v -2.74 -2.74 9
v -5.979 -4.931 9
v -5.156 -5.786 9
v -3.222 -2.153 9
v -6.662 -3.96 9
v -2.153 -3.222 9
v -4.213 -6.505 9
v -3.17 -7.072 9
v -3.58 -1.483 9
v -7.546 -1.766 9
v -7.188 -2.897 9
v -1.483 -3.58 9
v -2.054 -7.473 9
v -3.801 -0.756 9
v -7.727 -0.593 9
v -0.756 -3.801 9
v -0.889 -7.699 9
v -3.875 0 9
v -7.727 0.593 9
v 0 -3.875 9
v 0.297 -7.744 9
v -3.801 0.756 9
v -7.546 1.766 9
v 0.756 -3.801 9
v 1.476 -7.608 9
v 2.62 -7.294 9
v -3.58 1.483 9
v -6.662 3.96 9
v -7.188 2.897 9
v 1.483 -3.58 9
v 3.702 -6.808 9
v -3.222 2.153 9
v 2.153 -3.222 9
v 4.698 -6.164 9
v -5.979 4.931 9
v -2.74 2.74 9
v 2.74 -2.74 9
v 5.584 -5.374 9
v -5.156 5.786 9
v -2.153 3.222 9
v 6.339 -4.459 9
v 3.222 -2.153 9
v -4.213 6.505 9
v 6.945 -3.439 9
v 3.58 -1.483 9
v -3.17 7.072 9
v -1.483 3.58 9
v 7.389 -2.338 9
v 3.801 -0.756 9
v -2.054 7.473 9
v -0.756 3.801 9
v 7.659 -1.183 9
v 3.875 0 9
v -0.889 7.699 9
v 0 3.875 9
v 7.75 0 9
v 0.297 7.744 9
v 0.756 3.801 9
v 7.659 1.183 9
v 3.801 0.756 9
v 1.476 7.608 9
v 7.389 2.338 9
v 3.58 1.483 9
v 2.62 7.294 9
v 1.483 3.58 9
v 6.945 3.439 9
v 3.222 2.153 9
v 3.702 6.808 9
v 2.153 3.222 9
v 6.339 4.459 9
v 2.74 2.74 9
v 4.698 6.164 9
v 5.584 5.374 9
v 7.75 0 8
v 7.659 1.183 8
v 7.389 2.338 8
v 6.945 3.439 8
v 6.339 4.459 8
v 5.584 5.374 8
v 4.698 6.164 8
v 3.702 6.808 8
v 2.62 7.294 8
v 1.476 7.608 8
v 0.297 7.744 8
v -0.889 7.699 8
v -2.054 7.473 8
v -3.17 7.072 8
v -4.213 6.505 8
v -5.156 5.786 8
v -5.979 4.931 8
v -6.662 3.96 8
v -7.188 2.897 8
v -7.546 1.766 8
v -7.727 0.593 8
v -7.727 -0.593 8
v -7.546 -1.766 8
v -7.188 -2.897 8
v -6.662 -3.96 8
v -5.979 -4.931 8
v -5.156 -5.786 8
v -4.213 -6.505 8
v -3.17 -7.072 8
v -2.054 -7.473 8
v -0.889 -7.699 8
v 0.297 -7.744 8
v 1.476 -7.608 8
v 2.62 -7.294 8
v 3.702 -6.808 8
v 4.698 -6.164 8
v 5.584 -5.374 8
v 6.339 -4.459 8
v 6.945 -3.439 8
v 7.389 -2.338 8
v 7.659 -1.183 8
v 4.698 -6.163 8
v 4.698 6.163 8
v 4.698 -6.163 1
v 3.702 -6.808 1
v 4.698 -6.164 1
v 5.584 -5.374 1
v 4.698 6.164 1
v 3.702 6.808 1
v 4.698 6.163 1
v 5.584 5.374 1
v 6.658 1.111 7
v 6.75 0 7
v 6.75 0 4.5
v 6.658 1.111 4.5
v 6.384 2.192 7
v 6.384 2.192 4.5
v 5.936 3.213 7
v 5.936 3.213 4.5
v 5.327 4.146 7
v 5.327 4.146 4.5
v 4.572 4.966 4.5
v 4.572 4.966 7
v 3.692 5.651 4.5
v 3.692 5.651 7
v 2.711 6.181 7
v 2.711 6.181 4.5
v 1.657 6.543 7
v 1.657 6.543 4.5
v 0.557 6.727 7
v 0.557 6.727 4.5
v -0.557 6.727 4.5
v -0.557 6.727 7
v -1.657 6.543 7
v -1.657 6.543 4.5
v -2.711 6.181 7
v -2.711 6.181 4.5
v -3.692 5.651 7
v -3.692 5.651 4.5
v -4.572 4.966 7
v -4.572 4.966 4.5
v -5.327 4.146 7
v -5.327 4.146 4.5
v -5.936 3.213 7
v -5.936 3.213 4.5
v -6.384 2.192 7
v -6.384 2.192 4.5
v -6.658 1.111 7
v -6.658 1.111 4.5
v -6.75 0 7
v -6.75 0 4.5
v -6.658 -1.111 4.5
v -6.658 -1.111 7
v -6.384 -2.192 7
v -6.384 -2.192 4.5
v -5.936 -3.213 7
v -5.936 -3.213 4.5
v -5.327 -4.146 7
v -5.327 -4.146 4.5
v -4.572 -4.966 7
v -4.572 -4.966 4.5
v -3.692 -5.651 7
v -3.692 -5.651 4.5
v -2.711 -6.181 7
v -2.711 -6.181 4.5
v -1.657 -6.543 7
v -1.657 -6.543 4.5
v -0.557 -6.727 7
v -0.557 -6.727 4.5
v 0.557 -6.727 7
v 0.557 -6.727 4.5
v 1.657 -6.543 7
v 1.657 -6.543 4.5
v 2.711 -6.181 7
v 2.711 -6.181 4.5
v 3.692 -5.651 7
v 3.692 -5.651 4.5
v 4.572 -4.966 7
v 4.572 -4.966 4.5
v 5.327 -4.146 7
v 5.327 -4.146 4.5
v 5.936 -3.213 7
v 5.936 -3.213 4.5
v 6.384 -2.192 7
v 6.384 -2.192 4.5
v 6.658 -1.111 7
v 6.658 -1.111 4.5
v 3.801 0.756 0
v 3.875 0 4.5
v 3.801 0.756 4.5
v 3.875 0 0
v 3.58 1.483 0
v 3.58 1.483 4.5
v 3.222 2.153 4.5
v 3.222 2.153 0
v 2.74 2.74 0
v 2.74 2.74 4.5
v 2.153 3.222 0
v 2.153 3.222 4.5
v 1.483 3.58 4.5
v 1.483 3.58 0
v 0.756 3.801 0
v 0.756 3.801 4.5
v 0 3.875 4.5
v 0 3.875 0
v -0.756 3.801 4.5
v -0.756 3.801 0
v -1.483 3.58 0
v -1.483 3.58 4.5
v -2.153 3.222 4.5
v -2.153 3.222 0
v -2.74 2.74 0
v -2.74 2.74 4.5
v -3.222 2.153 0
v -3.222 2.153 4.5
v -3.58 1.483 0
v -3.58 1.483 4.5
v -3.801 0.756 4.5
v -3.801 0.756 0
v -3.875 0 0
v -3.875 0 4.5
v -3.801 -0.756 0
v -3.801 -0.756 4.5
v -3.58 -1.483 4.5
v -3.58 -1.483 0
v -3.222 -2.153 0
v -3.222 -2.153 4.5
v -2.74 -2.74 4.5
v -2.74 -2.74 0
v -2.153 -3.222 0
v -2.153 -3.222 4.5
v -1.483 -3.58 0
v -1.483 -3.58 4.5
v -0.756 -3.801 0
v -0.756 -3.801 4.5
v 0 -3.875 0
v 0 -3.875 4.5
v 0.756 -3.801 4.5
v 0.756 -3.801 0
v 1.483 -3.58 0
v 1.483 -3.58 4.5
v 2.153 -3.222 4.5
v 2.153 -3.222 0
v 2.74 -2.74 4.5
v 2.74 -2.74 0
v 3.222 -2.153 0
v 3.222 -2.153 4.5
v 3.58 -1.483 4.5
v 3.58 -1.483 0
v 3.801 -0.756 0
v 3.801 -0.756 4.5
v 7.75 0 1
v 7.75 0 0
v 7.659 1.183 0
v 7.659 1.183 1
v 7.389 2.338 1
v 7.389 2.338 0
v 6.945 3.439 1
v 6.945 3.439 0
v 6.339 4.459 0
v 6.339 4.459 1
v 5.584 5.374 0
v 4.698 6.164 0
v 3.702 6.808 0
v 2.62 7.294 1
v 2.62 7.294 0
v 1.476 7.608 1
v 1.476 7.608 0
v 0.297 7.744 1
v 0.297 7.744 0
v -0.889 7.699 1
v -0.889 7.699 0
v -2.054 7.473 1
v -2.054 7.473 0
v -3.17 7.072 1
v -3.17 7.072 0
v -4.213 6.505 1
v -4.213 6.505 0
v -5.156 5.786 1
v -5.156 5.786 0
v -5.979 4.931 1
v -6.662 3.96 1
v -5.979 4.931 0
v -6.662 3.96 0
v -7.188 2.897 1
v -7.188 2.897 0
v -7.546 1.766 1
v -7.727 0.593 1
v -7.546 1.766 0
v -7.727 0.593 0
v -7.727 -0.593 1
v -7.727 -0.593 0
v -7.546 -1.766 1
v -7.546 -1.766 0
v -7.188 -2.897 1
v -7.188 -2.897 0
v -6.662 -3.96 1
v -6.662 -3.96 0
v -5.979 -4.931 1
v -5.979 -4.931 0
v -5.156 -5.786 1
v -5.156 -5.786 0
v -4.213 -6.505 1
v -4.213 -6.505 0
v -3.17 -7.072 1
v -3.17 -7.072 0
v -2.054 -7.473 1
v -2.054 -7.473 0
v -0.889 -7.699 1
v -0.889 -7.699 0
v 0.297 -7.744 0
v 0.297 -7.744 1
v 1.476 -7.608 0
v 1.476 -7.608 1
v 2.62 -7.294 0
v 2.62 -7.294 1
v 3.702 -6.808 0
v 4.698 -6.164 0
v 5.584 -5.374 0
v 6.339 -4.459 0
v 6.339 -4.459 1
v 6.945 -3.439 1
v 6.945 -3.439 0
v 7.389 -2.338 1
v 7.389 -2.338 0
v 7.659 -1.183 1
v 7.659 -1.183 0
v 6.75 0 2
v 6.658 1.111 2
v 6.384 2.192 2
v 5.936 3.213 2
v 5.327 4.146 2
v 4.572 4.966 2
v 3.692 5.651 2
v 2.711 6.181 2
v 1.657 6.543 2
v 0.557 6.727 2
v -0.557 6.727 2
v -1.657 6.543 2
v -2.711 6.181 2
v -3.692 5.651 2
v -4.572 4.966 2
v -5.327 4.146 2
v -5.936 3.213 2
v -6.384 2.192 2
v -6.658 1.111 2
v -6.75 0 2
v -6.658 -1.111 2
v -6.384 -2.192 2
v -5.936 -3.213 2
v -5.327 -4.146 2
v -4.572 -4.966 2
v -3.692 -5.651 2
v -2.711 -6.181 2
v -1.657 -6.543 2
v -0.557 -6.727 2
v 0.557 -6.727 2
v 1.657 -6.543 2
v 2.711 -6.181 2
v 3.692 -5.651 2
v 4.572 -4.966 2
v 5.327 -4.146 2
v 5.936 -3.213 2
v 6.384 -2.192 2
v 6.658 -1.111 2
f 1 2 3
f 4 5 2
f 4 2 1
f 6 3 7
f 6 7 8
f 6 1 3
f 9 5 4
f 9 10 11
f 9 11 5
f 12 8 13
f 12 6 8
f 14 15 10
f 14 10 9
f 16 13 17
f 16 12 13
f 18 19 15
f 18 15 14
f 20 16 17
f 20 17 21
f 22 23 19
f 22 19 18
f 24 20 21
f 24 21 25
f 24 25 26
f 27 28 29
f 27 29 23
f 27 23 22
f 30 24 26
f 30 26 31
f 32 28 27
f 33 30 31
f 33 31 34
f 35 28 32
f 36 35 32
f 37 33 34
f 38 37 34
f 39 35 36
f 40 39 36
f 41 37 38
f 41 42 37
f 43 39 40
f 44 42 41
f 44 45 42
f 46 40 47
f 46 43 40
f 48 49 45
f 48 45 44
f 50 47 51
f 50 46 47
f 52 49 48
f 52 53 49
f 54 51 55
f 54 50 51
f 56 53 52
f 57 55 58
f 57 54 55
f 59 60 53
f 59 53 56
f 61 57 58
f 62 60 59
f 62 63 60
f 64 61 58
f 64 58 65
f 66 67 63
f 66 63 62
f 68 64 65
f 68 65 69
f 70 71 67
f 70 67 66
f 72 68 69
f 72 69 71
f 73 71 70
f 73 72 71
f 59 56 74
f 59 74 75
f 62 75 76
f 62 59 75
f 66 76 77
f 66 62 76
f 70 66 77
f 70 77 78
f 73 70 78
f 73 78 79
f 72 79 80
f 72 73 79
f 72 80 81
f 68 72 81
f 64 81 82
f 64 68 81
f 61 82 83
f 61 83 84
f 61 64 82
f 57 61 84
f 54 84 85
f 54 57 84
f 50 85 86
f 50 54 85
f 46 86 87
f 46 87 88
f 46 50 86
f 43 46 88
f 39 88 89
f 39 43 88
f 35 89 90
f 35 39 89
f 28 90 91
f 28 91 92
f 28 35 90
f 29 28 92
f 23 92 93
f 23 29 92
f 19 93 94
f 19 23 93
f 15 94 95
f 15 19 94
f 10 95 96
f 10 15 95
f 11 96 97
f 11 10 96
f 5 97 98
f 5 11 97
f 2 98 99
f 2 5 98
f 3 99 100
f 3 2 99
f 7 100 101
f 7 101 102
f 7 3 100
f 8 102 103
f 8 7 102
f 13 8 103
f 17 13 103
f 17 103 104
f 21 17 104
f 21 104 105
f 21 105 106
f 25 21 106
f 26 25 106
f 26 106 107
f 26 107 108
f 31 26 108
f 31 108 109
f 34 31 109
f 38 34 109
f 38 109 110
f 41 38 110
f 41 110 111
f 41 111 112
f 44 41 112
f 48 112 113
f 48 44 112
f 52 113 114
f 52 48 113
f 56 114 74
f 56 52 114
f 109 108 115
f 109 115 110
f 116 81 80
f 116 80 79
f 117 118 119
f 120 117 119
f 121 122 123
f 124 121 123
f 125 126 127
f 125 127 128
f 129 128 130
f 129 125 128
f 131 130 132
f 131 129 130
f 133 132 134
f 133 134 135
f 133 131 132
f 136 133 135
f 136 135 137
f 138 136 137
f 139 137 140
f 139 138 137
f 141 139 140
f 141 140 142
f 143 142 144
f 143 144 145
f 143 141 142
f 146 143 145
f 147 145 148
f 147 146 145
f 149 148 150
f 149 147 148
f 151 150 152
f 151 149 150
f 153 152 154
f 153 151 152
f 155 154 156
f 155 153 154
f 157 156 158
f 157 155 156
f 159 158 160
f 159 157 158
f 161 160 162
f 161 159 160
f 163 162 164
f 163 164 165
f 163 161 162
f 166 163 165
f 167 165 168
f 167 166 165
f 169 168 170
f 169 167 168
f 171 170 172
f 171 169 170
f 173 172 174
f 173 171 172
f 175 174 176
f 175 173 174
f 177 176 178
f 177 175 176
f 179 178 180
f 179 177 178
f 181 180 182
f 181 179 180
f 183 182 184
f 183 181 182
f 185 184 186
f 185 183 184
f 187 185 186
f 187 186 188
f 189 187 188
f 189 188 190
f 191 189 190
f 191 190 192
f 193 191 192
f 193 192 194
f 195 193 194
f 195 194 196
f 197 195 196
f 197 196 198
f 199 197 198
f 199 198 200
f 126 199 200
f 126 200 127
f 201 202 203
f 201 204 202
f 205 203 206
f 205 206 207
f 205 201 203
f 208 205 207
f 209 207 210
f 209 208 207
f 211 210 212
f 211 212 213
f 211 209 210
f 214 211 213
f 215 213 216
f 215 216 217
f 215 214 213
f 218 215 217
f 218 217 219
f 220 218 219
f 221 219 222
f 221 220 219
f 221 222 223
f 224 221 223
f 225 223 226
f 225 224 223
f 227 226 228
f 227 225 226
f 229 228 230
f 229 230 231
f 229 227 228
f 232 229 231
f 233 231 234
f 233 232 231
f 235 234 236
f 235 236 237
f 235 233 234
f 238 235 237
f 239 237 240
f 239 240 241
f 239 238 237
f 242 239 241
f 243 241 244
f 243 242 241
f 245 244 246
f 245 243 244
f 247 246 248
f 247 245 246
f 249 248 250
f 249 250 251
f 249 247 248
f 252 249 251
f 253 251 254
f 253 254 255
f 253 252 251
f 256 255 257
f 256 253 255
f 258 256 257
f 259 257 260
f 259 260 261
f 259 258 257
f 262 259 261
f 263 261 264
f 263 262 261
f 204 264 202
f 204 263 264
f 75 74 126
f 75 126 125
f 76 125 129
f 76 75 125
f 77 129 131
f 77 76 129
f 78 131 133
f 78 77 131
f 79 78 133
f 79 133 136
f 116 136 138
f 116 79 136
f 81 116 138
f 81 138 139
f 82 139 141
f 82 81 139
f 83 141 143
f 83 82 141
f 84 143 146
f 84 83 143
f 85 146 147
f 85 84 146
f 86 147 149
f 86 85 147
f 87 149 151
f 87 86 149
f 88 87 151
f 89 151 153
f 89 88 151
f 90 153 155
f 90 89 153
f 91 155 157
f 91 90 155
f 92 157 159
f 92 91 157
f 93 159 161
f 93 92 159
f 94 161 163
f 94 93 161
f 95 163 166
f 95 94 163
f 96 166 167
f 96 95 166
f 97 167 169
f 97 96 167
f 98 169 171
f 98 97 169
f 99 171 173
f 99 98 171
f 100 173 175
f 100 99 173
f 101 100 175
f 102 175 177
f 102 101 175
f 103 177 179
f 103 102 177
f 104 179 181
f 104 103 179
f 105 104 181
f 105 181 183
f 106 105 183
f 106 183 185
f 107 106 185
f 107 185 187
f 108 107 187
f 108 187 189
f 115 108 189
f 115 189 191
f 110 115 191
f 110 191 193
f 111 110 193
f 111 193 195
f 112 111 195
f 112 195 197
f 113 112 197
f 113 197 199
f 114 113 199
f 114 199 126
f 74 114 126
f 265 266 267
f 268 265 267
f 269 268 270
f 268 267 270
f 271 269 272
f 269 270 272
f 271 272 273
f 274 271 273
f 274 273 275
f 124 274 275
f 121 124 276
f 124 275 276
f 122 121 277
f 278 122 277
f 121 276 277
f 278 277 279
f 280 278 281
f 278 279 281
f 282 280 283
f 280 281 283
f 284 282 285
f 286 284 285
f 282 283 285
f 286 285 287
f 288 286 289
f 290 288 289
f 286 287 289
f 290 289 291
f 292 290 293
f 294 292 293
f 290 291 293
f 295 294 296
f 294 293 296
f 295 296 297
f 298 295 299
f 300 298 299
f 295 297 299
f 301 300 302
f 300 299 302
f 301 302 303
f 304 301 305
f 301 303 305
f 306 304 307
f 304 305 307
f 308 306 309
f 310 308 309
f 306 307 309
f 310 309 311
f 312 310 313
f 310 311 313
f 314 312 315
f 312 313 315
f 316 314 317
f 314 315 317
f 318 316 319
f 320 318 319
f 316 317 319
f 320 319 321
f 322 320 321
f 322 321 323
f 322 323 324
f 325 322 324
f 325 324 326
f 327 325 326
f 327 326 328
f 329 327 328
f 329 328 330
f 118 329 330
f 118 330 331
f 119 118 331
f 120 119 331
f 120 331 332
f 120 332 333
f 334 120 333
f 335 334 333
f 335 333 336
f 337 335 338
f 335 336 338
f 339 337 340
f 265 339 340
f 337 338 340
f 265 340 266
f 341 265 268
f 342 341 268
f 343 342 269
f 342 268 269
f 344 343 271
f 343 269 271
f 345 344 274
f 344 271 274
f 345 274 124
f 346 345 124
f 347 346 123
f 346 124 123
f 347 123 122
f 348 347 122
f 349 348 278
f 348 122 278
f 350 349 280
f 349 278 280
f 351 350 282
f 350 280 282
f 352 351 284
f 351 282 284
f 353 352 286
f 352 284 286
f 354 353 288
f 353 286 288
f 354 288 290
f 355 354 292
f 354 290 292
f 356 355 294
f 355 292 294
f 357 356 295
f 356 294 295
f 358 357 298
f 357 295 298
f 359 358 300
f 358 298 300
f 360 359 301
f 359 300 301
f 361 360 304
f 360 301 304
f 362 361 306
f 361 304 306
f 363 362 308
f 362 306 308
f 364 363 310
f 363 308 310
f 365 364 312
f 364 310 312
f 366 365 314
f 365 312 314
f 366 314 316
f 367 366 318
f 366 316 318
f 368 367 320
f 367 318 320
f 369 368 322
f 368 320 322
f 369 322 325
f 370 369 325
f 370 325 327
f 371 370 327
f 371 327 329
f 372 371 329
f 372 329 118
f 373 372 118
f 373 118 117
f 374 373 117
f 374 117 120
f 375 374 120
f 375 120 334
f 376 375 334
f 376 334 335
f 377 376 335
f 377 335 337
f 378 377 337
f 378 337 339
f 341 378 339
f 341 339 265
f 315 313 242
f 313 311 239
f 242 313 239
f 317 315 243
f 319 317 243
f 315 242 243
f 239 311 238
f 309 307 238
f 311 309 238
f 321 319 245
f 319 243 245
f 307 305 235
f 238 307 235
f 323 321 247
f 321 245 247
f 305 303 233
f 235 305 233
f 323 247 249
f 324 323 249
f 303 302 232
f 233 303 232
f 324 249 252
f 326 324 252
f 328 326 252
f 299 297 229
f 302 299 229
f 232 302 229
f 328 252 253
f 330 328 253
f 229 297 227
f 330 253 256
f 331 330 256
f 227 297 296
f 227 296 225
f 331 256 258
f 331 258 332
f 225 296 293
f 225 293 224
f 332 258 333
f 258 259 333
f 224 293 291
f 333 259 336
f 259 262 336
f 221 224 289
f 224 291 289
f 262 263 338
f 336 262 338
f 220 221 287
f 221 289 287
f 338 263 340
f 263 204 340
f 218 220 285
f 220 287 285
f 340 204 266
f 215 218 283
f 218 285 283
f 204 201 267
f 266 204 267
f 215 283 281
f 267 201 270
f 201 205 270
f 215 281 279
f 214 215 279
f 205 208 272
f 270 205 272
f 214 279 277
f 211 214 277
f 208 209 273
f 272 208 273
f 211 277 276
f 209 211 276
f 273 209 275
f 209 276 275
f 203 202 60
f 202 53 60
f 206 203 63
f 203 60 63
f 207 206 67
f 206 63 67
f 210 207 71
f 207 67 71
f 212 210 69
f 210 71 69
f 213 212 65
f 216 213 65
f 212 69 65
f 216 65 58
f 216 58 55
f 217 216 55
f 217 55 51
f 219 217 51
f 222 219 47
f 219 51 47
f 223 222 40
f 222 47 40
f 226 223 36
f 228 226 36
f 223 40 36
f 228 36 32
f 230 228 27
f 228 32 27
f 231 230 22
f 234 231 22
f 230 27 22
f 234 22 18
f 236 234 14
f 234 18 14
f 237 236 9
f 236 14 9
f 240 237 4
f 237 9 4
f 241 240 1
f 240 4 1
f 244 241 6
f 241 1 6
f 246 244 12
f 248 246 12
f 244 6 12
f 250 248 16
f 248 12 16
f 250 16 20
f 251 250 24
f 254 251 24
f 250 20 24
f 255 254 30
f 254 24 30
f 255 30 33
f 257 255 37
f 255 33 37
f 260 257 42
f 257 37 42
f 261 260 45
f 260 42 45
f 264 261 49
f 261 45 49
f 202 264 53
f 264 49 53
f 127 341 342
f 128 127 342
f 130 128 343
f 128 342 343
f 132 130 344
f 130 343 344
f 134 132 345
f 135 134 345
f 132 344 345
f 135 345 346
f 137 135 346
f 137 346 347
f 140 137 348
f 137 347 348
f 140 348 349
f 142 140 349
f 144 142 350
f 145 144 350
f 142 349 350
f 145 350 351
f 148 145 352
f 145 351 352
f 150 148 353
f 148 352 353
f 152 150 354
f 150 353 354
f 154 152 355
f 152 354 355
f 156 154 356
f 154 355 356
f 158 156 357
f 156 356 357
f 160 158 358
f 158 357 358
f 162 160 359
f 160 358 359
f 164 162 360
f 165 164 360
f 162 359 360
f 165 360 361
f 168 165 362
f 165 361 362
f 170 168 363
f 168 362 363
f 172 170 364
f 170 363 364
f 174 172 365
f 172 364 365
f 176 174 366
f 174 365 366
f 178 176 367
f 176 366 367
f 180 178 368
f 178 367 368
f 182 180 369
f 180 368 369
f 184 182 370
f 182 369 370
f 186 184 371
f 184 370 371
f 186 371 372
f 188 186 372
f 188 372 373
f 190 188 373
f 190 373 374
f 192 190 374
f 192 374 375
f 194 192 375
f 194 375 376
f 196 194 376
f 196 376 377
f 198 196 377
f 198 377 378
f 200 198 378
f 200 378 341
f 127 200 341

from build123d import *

# Parameters (mm, degrees)
SKETCH1_R           = 7.75
SKETCH1_R_2         = 3.875
BOSS_EXTRUDE1_DEPTH = 1
SKETCH2_R           = 6.75
SKETCH2_R_2         = 3.875
BOSS_EXTRUDE2_DEPTH = 3.5
CHAMFER1_SIZE       = 1


with BuildPart() as part:
    # Sketch1 → Boss-Extrude1 (new body)
    with BuildSketch(Plane.XY):
        Circle(SKETCH1_R)
        Circle(SKETCH1_R_2, mode=Mode.SUBTRACT)
    extrude(amount=BOSS_EXTRUDE1_DEPTH)

    # Sketch2 → Boss-Extrude2 (add)
    with BuildSketch(Plane.XY.offset(1)):
        Circle(SKETCH2_R)
        Circle(SKETCH2_R_2, mode=Mode.SUBTRACT)
    extrude(amount=BOSS_EXTRUDE2_DEPTH)

    # Chamfer1
    chamfer1_edges = [part.edges().sort_by_distance(p)[0] for p in [
        (-6.75, 0, 1),
    ]]
    chamfer(chamfer1_edges, length=CHAMFER1_SIZE - 0.0001)  # a hair under: the kernel refuses the full size

    # Mirror5: part across plane


with BuildPart() as part_1:
    add(part.part)
    add(part.part.mirror(Plane.XY.offset(4.5)))


solid = part_1.part
